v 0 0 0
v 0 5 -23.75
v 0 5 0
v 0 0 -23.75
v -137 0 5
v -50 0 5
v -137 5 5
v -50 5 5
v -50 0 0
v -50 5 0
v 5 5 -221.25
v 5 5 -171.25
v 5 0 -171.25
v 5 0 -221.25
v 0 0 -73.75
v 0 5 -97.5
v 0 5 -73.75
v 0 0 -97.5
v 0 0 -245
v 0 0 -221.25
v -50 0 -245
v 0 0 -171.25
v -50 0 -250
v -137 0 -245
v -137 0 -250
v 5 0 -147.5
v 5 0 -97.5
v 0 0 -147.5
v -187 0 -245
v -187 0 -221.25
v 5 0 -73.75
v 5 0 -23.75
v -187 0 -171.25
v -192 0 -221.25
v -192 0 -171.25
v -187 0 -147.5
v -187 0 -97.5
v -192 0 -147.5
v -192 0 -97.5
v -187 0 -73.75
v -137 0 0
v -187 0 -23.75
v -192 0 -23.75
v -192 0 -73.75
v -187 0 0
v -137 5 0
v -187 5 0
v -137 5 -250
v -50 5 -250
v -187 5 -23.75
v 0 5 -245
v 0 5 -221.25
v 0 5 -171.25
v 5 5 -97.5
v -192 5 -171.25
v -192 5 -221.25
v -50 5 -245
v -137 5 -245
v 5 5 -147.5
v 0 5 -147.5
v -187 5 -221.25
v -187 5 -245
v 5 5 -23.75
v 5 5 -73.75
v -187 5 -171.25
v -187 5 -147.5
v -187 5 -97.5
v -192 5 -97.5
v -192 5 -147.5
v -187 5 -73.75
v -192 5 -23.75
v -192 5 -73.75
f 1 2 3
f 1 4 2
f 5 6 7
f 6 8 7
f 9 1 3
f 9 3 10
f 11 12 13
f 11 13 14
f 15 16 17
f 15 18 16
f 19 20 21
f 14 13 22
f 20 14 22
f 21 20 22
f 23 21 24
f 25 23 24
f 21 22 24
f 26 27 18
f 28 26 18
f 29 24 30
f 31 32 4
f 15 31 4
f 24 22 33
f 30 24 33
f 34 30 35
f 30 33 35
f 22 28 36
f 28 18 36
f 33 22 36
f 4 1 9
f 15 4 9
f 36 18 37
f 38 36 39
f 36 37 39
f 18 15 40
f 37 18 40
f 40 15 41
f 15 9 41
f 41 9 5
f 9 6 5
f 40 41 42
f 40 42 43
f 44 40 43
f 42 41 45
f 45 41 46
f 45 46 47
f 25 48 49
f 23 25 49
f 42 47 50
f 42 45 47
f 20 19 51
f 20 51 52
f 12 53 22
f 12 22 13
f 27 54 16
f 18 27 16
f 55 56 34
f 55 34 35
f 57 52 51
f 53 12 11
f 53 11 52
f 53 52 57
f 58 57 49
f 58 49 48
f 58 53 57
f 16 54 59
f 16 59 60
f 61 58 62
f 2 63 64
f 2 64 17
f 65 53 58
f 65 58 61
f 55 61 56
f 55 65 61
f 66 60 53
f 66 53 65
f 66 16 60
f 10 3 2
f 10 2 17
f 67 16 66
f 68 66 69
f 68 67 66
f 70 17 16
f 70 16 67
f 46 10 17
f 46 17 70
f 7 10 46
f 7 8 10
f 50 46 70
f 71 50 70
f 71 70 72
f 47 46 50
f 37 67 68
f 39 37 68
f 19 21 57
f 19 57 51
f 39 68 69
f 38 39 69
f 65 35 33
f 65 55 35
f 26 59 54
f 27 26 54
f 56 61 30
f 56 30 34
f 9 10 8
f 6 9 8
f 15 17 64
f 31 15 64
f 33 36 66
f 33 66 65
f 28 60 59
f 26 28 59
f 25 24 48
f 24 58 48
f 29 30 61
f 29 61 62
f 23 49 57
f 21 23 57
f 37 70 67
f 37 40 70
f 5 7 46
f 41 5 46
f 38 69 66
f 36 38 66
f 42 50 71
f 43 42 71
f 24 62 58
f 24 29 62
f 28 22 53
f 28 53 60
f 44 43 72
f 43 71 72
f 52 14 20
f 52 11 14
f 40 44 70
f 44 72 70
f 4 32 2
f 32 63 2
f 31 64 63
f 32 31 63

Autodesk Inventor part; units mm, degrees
ref_plane "YZ Plane" through (0, 0, 0) normal (1, 0, 0) x (0, 1, 0)
ref_plane "XZ Plane" through (0, 0, 0) normal (0, 1, 0) x (-1, 0, 0)
ref_plane "XY Plane" through (0, 0, 0) normal (0, 0, 1) x (1, 0, 0)
sketch "Sketch1" plane through (0, 0, 0) normal (0, 1, 0) x (-1, 0, 0)
  line L0 (0, 0) -> (187, 0)
  line L1 (187, 0) -> (187, -245)
  line L2 (187, -245) -> (0, -245)
  line L3 (0, -245) -> (0, 0)
  dimension "d0" = 245
  dimension "d1" = 187
extrude "Extrusion1" add sketch "Sketch1" along normal blind 5
sketch "Sketch2" plane through (0, 5, 0) normal (0, 1, 0) x (1, 0, 0)
  line L0 (-187, 0) -> (0, 0) projected
  line L1 (0, 0) -> (0, 245) projected
  line L2 (0, 245) -> (-187, 245) projected
  line L3 (-187, 245) -> (-187, 0) projected
  line L4 (-187, 221.25) -> (-192, 221.25)
  line L5 (-192, 221.25) -> (-192, 171.25)
  line L6 (-192, 171.25) -> (-187, 171.25)
  line L7 (-187, 171.25) -> (-187, 221.25)
  line L8 (-192, 147.5) -> (-187, 147.5)
  line L9 (-187, 147.5) -> (-187, 97.5)
  line L10 (-187, 97.5) -> (-192, 97.5)
  line L11 (-192, 97.5) -> (-192, 147.5)
  line L12 (-192, 73.75) -> (-187, 73.75)
  line L13 (-187, 73.75) -> (-187, 23.75)
  line L14 (-187, 23.75) -> (-192, 23.75)
  line L15 (-192, 23.75) -> (-192, 73.75)
  line L16 (5, 221.25) -> (0, 221.25)
  line L17 (0, 221.25) -> (0, 171.25)
  line L18 (0, 171.25) -> (5, 171.25)
  line L19 (5, 171.25) -> (5, 221.25)
  line L20 (0, 147.5) -> (5, 147.5)
  line L21 (5, 147.5) -> (5, 97.5)
  line L22 (5, 97.5) -> (0, 97.5)
  line L23 (0, 97.5) -> (0, 147.5)
  line L24 (0, 73.75) -> (5, 73.75)
  line L25 (5, 73.75) -> (5, 23.75)
  line L26 (5, 23.75) -> (0, 23.75)
  line L27 (0, 23.75) -> (0, 73.75)
  line L28 (-137, 250) -> (-50, 250)
  line L29 (-50, 250) -> (-50, 245)
  line L30 (-50, 245) -> (-137, 245)
  line L31 (-137, 245) -> (-137, 250)
  line L32 (-137, 0) -> (-50, 0)
  line L33 (-50, 0) -> (-50, -5)
  line L34 (-50, -5) -> (-137, -5)
  line L35 (-137, -5) -> (-137, 0)
  point P0 (-50, 0)
  dimension "d4" = 5
  dimension "d5" = 50
  dimension "d6" = 50
  dimension "d7" = 50
  dimension "d8" = 5
  dimension "d9" = 5
  dimension "d10" = 23.75
  dimension "d11" = 23.75
  dimension "d12" = 23.75
  dimension "d13" = 5
  dimension "d14" = 50
  dimension "d15" = 50
  dimension "d16" = 50
  dimension "d17" = 5
  dimension "d18" = 5
  dimension "d19" = 23.75
  dimension "d20" = 23.75
  dimension "d21" = 23.75
  dimension "d22" = 5
  dimension "d23" = 50
  dimension "d24" = 50
  dimension "d25" = 5
  dimension "d26" = 50
  dimension "d27" = 50
extrude "Extrusion2" add sketch "Sketch2" against normal blind 5 contours L0 L33 L34 L35 | L14 L15 L12 L3 | L10 L11 L8 L3 | L1 L24 L25 L26 | L6 L5 L4 L3 | L1 L20 L21 L22 | L1 L16 L19 L18 | L31 L28 L29 L2
properties part number "Placa de abajo"
